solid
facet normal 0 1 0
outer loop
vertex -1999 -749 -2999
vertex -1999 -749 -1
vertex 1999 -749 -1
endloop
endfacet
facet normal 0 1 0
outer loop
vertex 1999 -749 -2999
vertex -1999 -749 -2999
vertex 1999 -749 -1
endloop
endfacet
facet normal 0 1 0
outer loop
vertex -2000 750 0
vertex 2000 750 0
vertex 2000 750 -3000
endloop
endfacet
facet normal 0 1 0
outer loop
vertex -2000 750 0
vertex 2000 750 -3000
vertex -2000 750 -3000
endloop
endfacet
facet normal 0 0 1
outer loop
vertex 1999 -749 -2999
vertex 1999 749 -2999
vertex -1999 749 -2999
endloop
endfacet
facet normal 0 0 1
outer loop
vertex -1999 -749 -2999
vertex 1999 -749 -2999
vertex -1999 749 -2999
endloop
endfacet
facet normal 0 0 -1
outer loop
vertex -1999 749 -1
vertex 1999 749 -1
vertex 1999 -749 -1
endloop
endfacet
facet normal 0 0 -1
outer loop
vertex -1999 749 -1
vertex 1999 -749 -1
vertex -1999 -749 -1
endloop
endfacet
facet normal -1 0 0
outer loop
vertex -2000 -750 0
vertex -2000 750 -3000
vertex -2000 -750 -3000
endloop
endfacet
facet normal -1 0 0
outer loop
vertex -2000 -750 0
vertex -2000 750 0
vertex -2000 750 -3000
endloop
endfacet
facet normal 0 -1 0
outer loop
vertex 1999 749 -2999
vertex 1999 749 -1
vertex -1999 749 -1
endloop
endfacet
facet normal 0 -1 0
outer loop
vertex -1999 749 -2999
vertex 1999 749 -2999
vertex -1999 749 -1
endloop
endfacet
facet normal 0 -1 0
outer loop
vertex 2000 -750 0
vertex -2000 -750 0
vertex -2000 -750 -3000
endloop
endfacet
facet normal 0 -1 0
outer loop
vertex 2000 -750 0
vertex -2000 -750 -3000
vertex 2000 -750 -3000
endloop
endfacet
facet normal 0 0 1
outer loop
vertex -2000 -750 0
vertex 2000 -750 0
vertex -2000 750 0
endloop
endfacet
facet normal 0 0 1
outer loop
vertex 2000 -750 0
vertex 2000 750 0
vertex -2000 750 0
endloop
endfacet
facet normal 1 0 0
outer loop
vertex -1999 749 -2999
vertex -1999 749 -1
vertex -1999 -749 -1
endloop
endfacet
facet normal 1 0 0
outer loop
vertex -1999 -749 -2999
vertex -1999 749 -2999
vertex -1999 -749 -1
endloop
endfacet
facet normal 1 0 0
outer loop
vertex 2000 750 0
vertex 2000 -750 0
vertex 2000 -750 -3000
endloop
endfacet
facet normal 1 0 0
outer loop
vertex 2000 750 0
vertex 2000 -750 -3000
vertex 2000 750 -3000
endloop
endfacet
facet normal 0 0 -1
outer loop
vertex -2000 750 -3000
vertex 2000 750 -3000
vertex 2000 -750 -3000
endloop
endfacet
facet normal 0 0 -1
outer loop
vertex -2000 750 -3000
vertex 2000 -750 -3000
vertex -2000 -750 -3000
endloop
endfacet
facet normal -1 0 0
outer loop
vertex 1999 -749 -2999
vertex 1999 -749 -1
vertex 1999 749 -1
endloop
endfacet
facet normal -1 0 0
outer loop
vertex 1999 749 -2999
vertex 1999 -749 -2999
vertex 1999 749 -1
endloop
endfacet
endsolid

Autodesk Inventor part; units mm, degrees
ref_plane "YZ Plane" through (0, 0, 0) normal (1, 0, 0) x (0, 1, 0)
ref_plane "XZ Plane" through (0, 0, 0) normal (0, 1, 0) x (-1, 0, 0)
ref_plane "XY Plane" through (0, 0, 0) normal (0, 0, 1) x (1, 0, 0)
ref_plane "Work Plane1" through (0, 0, 0) normal (0, 0, -1) x (-1, 0, 0)
sketch "Sketch1" plane through (0, 0, 0) normal (0, 0, -1) x (-1, 0, 0)
  line L0 (2000, -750) -> (-2000, -750)
  line L1 (-2000, -750) -> (-2000, 750)
  line L2 (-2000, 750) -> (2000, 750)
  line L3 (2000, 750) -> (2000, -750)
  line L4 (2000, -750) -> (-2000, 750) construction
  line L5 (-2000, -750) -> (2000, 750) construction
  point P0 (0, 0)
  dimension "d0" = 4000
  dimension "d1" = 1500
extrude "Extrusion1" add sketch "Sketch1" along normal blind 3000
shell "Shell1" thickness 1 removed faces 0
properties part number "CV"
